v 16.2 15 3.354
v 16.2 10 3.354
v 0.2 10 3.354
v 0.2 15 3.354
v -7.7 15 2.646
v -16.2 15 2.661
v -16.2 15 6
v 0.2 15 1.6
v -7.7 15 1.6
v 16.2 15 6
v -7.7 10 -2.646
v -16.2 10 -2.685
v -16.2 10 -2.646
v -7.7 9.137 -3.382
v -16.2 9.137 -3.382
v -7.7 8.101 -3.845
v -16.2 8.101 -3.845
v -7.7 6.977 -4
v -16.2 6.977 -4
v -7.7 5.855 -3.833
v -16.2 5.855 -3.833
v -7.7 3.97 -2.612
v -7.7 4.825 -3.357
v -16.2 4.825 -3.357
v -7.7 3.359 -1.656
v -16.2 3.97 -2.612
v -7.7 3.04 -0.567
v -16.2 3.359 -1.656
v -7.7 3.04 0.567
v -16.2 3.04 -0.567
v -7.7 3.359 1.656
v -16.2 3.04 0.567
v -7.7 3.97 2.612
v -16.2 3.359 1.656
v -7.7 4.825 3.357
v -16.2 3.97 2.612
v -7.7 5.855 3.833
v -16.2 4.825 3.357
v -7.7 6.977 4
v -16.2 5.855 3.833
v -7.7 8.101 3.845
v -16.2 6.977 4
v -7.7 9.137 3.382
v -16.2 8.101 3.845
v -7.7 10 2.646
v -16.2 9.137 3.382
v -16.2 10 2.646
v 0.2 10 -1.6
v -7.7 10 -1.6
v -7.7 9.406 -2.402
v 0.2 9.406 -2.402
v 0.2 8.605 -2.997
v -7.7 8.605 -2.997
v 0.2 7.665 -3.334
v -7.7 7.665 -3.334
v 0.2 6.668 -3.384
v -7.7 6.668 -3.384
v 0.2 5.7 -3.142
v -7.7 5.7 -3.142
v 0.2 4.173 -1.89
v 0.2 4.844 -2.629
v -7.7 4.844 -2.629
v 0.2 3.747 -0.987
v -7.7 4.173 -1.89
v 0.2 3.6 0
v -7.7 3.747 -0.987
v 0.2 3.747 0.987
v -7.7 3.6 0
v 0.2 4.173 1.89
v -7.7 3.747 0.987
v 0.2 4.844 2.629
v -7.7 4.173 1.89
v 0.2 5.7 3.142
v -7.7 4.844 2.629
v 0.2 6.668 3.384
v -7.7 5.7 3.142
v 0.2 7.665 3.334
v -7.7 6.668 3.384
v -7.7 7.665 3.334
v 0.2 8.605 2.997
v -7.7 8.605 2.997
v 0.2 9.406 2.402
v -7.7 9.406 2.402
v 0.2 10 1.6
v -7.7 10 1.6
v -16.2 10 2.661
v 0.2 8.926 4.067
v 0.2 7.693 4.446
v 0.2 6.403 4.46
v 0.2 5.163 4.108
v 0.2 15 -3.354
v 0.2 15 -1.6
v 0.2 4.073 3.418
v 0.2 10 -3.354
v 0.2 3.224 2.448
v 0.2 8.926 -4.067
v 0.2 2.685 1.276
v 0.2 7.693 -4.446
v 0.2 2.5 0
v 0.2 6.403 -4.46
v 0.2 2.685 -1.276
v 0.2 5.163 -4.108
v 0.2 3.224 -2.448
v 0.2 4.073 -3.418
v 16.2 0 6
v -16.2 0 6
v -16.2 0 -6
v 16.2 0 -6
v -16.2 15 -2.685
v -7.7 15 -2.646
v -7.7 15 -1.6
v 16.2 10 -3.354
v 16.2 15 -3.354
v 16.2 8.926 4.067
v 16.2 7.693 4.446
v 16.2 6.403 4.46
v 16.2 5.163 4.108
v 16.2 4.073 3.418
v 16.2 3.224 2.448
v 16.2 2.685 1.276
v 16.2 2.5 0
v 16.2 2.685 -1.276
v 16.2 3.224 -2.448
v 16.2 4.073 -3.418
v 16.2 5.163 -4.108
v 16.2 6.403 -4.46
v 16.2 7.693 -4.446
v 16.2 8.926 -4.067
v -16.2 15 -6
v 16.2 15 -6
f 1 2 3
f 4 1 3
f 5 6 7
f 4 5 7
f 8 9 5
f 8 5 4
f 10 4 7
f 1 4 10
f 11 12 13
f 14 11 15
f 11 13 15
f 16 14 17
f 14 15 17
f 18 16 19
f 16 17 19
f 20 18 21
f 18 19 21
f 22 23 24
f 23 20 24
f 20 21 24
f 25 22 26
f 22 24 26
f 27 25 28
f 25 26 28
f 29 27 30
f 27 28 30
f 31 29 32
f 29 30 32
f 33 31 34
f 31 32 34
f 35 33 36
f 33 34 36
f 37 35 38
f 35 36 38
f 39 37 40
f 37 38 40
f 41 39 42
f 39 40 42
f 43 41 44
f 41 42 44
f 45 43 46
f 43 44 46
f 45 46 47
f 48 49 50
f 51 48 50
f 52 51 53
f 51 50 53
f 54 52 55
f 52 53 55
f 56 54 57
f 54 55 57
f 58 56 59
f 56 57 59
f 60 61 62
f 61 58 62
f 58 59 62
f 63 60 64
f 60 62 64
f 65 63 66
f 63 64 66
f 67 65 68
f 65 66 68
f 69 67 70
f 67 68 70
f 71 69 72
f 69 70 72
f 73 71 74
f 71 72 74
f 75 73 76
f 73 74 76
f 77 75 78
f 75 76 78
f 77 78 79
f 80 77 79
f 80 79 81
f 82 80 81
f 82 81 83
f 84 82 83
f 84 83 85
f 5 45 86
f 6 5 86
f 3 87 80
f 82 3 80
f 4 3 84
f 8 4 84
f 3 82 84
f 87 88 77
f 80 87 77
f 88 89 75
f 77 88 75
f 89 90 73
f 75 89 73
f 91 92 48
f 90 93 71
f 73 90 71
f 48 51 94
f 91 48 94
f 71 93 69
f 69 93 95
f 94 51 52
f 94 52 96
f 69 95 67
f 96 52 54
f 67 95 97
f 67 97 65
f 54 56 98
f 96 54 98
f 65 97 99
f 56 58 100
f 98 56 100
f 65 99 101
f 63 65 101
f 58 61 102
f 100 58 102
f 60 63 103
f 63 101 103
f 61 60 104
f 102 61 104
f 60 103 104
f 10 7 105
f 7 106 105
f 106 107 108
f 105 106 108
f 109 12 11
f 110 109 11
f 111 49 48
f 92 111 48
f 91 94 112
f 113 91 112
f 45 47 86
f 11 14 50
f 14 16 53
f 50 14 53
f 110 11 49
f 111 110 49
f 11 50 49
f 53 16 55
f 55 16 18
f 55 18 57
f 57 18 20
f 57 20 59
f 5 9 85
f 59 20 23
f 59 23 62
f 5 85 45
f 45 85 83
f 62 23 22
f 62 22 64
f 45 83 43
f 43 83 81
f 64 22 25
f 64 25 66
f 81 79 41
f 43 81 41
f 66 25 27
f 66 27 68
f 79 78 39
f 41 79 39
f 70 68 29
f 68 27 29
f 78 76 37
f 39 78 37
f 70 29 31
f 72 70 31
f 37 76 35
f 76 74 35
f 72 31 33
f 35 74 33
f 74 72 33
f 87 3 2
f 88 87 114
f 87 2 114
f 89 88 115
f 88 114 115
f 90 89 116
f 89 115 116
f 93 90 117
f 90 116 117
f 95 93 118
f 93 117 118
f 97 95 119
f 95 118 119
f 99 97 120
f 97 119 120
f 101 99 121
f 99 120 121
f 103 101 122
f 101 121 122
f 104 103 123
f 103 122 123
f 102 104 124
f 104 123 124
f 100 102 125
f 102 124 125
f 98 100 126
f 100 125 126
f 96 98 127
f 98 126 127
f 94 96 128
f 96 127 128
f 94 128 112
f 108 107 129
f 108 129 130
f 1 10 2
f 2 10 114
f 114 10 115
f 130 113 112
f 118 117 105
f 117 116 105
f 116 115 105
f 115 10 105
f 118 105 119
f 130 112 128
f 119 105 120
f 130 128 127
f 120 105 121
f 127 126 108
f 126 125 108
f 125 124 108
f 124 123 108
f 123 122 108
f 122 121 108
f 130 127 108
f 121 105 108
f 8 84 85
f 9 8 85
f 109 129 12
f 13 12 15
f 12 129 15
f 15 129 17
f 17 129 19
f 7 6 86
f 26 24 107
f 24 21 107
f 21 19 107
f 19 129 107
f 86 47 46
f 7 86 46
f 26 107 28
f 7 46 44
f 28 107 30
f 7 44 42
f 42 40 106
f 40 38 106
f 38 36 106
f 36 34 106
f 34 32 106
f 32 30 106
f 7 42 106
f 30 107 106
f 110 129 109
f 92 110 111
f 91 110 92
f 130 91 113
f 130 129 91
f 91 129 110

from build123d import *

# Parameters (mm, degrees)
SKETCH_1_W          = 32.4
SKETCH_1_H          = 12
EXTRUDE_1_DEPTH     = 10
SKETCH_4_R          = 4
CUT_EXTRUDE_2_DEPTH = 8.5
SKETCH_7_R          = 3.4
CUT_EXTRUDE_3_DEPTH = 7.9
SKETCH_8_R          = 4.5
CUT_EXTRUDE_4_DEPTH = 16
SKETCH_9_W          = 32.4
SKETCH_9_H          = 2.645898034
EXTRUDE_2_DEPTH     = 5
EXTRUDE_3_DEPTH     = 5
EXTRUDE_4_DEPTH     = 5


with BuildPart() as part:
    # 草圖1 → 填料-伸長1 (new body)
    with BuildSketch(Plane(origin=(0, 0, 0), x_dir=(1, 0, 0), z_dir=(0, 1, 0))):
        Rectangle(SKETCH_1_W, SKETCH_1_H)
    extrude(amount=EXTRUDE_1_DEPTH)

    # 草圖4 → 除料-伸長2 (cut)
    with BuildSketch(Plane.ZY.offset(16.2)):
        with Locations((0, 7)):
            Circle(SKETCH_4_R)
    extrude(amount=-CUT_EXTRUDE_2_DEPTH, mode=Mode.SUBTRACT)

    # 草圖7 → 除料-伸長3 (cut)
    with BuildSketch(Plane.ZY.offset(7.7)):
        with Locations((0, 7)):
            Circle(SKETCH_7_R)
    extrude(amount=-CUT_EXTRUDE_3_DEPTH, mode=Mode.SUBTRACT)

    # 草圖8 → 除料-伸長4 (cut)
    with BuildSketch(Plane(origin=(16.2, 0, 0), x_dir=(0, 0, -1), z_dir=(1, 0, 0))):
        with Locations((0, 7)):
            Circle(SKETCH_8_R)
    extrude(amount=-CUT_EXTRUDE_4_DEPTH, mode=Mode.SUBTRACT)

    # 草圖9 → 填料-伸長2 (add)
    with BuildSketch(Plane(origin=(0, 10, 0), x_dir=(1, 0, 0), z_dir=(0, 1, 0))):
        with Locations((0, 4.677050983)):
            Rectangle(SKETCH_9_W, SKETCH_9_H)
    extrude(amount=EXTRUDE_2_DEPTH)

    # 草圖10 → 填料-伸長3 (add)
    with BuildSketch(Plane(origin=(0, 10, 0), x_dir=(1, 0, 0), z_dir=(0, 1, 0))):
        Polygon((-16.2, 3.372532617), (-16.2, 2.685476071), (-7.7, 2.645751311), (-7.7, 1.6), (0.2, 1.6), (0.2, 3.354101966), align=None)
    extrude(amount=EXTRUDE_3_DEPTH)

    # 草圖11 → 填料-伸長4 (add)
    with BuildSketch(Plane(origin=(0, 10, 0), x_dir=(1, 0, 0), z_dir=(0, 1, 0))):
        Polygon((-16.2, -2.660675208), (-16.2, -6), (16.2, -6), (16.2, -3.354101966), (0.2, -3.354101966), (0.2, -1.6), (-7.7, -1.6), (-7.7, -2.645751311), align=None)
    extrude(amount=EXTRUDE_4_DEPTH)


solid = part.part
